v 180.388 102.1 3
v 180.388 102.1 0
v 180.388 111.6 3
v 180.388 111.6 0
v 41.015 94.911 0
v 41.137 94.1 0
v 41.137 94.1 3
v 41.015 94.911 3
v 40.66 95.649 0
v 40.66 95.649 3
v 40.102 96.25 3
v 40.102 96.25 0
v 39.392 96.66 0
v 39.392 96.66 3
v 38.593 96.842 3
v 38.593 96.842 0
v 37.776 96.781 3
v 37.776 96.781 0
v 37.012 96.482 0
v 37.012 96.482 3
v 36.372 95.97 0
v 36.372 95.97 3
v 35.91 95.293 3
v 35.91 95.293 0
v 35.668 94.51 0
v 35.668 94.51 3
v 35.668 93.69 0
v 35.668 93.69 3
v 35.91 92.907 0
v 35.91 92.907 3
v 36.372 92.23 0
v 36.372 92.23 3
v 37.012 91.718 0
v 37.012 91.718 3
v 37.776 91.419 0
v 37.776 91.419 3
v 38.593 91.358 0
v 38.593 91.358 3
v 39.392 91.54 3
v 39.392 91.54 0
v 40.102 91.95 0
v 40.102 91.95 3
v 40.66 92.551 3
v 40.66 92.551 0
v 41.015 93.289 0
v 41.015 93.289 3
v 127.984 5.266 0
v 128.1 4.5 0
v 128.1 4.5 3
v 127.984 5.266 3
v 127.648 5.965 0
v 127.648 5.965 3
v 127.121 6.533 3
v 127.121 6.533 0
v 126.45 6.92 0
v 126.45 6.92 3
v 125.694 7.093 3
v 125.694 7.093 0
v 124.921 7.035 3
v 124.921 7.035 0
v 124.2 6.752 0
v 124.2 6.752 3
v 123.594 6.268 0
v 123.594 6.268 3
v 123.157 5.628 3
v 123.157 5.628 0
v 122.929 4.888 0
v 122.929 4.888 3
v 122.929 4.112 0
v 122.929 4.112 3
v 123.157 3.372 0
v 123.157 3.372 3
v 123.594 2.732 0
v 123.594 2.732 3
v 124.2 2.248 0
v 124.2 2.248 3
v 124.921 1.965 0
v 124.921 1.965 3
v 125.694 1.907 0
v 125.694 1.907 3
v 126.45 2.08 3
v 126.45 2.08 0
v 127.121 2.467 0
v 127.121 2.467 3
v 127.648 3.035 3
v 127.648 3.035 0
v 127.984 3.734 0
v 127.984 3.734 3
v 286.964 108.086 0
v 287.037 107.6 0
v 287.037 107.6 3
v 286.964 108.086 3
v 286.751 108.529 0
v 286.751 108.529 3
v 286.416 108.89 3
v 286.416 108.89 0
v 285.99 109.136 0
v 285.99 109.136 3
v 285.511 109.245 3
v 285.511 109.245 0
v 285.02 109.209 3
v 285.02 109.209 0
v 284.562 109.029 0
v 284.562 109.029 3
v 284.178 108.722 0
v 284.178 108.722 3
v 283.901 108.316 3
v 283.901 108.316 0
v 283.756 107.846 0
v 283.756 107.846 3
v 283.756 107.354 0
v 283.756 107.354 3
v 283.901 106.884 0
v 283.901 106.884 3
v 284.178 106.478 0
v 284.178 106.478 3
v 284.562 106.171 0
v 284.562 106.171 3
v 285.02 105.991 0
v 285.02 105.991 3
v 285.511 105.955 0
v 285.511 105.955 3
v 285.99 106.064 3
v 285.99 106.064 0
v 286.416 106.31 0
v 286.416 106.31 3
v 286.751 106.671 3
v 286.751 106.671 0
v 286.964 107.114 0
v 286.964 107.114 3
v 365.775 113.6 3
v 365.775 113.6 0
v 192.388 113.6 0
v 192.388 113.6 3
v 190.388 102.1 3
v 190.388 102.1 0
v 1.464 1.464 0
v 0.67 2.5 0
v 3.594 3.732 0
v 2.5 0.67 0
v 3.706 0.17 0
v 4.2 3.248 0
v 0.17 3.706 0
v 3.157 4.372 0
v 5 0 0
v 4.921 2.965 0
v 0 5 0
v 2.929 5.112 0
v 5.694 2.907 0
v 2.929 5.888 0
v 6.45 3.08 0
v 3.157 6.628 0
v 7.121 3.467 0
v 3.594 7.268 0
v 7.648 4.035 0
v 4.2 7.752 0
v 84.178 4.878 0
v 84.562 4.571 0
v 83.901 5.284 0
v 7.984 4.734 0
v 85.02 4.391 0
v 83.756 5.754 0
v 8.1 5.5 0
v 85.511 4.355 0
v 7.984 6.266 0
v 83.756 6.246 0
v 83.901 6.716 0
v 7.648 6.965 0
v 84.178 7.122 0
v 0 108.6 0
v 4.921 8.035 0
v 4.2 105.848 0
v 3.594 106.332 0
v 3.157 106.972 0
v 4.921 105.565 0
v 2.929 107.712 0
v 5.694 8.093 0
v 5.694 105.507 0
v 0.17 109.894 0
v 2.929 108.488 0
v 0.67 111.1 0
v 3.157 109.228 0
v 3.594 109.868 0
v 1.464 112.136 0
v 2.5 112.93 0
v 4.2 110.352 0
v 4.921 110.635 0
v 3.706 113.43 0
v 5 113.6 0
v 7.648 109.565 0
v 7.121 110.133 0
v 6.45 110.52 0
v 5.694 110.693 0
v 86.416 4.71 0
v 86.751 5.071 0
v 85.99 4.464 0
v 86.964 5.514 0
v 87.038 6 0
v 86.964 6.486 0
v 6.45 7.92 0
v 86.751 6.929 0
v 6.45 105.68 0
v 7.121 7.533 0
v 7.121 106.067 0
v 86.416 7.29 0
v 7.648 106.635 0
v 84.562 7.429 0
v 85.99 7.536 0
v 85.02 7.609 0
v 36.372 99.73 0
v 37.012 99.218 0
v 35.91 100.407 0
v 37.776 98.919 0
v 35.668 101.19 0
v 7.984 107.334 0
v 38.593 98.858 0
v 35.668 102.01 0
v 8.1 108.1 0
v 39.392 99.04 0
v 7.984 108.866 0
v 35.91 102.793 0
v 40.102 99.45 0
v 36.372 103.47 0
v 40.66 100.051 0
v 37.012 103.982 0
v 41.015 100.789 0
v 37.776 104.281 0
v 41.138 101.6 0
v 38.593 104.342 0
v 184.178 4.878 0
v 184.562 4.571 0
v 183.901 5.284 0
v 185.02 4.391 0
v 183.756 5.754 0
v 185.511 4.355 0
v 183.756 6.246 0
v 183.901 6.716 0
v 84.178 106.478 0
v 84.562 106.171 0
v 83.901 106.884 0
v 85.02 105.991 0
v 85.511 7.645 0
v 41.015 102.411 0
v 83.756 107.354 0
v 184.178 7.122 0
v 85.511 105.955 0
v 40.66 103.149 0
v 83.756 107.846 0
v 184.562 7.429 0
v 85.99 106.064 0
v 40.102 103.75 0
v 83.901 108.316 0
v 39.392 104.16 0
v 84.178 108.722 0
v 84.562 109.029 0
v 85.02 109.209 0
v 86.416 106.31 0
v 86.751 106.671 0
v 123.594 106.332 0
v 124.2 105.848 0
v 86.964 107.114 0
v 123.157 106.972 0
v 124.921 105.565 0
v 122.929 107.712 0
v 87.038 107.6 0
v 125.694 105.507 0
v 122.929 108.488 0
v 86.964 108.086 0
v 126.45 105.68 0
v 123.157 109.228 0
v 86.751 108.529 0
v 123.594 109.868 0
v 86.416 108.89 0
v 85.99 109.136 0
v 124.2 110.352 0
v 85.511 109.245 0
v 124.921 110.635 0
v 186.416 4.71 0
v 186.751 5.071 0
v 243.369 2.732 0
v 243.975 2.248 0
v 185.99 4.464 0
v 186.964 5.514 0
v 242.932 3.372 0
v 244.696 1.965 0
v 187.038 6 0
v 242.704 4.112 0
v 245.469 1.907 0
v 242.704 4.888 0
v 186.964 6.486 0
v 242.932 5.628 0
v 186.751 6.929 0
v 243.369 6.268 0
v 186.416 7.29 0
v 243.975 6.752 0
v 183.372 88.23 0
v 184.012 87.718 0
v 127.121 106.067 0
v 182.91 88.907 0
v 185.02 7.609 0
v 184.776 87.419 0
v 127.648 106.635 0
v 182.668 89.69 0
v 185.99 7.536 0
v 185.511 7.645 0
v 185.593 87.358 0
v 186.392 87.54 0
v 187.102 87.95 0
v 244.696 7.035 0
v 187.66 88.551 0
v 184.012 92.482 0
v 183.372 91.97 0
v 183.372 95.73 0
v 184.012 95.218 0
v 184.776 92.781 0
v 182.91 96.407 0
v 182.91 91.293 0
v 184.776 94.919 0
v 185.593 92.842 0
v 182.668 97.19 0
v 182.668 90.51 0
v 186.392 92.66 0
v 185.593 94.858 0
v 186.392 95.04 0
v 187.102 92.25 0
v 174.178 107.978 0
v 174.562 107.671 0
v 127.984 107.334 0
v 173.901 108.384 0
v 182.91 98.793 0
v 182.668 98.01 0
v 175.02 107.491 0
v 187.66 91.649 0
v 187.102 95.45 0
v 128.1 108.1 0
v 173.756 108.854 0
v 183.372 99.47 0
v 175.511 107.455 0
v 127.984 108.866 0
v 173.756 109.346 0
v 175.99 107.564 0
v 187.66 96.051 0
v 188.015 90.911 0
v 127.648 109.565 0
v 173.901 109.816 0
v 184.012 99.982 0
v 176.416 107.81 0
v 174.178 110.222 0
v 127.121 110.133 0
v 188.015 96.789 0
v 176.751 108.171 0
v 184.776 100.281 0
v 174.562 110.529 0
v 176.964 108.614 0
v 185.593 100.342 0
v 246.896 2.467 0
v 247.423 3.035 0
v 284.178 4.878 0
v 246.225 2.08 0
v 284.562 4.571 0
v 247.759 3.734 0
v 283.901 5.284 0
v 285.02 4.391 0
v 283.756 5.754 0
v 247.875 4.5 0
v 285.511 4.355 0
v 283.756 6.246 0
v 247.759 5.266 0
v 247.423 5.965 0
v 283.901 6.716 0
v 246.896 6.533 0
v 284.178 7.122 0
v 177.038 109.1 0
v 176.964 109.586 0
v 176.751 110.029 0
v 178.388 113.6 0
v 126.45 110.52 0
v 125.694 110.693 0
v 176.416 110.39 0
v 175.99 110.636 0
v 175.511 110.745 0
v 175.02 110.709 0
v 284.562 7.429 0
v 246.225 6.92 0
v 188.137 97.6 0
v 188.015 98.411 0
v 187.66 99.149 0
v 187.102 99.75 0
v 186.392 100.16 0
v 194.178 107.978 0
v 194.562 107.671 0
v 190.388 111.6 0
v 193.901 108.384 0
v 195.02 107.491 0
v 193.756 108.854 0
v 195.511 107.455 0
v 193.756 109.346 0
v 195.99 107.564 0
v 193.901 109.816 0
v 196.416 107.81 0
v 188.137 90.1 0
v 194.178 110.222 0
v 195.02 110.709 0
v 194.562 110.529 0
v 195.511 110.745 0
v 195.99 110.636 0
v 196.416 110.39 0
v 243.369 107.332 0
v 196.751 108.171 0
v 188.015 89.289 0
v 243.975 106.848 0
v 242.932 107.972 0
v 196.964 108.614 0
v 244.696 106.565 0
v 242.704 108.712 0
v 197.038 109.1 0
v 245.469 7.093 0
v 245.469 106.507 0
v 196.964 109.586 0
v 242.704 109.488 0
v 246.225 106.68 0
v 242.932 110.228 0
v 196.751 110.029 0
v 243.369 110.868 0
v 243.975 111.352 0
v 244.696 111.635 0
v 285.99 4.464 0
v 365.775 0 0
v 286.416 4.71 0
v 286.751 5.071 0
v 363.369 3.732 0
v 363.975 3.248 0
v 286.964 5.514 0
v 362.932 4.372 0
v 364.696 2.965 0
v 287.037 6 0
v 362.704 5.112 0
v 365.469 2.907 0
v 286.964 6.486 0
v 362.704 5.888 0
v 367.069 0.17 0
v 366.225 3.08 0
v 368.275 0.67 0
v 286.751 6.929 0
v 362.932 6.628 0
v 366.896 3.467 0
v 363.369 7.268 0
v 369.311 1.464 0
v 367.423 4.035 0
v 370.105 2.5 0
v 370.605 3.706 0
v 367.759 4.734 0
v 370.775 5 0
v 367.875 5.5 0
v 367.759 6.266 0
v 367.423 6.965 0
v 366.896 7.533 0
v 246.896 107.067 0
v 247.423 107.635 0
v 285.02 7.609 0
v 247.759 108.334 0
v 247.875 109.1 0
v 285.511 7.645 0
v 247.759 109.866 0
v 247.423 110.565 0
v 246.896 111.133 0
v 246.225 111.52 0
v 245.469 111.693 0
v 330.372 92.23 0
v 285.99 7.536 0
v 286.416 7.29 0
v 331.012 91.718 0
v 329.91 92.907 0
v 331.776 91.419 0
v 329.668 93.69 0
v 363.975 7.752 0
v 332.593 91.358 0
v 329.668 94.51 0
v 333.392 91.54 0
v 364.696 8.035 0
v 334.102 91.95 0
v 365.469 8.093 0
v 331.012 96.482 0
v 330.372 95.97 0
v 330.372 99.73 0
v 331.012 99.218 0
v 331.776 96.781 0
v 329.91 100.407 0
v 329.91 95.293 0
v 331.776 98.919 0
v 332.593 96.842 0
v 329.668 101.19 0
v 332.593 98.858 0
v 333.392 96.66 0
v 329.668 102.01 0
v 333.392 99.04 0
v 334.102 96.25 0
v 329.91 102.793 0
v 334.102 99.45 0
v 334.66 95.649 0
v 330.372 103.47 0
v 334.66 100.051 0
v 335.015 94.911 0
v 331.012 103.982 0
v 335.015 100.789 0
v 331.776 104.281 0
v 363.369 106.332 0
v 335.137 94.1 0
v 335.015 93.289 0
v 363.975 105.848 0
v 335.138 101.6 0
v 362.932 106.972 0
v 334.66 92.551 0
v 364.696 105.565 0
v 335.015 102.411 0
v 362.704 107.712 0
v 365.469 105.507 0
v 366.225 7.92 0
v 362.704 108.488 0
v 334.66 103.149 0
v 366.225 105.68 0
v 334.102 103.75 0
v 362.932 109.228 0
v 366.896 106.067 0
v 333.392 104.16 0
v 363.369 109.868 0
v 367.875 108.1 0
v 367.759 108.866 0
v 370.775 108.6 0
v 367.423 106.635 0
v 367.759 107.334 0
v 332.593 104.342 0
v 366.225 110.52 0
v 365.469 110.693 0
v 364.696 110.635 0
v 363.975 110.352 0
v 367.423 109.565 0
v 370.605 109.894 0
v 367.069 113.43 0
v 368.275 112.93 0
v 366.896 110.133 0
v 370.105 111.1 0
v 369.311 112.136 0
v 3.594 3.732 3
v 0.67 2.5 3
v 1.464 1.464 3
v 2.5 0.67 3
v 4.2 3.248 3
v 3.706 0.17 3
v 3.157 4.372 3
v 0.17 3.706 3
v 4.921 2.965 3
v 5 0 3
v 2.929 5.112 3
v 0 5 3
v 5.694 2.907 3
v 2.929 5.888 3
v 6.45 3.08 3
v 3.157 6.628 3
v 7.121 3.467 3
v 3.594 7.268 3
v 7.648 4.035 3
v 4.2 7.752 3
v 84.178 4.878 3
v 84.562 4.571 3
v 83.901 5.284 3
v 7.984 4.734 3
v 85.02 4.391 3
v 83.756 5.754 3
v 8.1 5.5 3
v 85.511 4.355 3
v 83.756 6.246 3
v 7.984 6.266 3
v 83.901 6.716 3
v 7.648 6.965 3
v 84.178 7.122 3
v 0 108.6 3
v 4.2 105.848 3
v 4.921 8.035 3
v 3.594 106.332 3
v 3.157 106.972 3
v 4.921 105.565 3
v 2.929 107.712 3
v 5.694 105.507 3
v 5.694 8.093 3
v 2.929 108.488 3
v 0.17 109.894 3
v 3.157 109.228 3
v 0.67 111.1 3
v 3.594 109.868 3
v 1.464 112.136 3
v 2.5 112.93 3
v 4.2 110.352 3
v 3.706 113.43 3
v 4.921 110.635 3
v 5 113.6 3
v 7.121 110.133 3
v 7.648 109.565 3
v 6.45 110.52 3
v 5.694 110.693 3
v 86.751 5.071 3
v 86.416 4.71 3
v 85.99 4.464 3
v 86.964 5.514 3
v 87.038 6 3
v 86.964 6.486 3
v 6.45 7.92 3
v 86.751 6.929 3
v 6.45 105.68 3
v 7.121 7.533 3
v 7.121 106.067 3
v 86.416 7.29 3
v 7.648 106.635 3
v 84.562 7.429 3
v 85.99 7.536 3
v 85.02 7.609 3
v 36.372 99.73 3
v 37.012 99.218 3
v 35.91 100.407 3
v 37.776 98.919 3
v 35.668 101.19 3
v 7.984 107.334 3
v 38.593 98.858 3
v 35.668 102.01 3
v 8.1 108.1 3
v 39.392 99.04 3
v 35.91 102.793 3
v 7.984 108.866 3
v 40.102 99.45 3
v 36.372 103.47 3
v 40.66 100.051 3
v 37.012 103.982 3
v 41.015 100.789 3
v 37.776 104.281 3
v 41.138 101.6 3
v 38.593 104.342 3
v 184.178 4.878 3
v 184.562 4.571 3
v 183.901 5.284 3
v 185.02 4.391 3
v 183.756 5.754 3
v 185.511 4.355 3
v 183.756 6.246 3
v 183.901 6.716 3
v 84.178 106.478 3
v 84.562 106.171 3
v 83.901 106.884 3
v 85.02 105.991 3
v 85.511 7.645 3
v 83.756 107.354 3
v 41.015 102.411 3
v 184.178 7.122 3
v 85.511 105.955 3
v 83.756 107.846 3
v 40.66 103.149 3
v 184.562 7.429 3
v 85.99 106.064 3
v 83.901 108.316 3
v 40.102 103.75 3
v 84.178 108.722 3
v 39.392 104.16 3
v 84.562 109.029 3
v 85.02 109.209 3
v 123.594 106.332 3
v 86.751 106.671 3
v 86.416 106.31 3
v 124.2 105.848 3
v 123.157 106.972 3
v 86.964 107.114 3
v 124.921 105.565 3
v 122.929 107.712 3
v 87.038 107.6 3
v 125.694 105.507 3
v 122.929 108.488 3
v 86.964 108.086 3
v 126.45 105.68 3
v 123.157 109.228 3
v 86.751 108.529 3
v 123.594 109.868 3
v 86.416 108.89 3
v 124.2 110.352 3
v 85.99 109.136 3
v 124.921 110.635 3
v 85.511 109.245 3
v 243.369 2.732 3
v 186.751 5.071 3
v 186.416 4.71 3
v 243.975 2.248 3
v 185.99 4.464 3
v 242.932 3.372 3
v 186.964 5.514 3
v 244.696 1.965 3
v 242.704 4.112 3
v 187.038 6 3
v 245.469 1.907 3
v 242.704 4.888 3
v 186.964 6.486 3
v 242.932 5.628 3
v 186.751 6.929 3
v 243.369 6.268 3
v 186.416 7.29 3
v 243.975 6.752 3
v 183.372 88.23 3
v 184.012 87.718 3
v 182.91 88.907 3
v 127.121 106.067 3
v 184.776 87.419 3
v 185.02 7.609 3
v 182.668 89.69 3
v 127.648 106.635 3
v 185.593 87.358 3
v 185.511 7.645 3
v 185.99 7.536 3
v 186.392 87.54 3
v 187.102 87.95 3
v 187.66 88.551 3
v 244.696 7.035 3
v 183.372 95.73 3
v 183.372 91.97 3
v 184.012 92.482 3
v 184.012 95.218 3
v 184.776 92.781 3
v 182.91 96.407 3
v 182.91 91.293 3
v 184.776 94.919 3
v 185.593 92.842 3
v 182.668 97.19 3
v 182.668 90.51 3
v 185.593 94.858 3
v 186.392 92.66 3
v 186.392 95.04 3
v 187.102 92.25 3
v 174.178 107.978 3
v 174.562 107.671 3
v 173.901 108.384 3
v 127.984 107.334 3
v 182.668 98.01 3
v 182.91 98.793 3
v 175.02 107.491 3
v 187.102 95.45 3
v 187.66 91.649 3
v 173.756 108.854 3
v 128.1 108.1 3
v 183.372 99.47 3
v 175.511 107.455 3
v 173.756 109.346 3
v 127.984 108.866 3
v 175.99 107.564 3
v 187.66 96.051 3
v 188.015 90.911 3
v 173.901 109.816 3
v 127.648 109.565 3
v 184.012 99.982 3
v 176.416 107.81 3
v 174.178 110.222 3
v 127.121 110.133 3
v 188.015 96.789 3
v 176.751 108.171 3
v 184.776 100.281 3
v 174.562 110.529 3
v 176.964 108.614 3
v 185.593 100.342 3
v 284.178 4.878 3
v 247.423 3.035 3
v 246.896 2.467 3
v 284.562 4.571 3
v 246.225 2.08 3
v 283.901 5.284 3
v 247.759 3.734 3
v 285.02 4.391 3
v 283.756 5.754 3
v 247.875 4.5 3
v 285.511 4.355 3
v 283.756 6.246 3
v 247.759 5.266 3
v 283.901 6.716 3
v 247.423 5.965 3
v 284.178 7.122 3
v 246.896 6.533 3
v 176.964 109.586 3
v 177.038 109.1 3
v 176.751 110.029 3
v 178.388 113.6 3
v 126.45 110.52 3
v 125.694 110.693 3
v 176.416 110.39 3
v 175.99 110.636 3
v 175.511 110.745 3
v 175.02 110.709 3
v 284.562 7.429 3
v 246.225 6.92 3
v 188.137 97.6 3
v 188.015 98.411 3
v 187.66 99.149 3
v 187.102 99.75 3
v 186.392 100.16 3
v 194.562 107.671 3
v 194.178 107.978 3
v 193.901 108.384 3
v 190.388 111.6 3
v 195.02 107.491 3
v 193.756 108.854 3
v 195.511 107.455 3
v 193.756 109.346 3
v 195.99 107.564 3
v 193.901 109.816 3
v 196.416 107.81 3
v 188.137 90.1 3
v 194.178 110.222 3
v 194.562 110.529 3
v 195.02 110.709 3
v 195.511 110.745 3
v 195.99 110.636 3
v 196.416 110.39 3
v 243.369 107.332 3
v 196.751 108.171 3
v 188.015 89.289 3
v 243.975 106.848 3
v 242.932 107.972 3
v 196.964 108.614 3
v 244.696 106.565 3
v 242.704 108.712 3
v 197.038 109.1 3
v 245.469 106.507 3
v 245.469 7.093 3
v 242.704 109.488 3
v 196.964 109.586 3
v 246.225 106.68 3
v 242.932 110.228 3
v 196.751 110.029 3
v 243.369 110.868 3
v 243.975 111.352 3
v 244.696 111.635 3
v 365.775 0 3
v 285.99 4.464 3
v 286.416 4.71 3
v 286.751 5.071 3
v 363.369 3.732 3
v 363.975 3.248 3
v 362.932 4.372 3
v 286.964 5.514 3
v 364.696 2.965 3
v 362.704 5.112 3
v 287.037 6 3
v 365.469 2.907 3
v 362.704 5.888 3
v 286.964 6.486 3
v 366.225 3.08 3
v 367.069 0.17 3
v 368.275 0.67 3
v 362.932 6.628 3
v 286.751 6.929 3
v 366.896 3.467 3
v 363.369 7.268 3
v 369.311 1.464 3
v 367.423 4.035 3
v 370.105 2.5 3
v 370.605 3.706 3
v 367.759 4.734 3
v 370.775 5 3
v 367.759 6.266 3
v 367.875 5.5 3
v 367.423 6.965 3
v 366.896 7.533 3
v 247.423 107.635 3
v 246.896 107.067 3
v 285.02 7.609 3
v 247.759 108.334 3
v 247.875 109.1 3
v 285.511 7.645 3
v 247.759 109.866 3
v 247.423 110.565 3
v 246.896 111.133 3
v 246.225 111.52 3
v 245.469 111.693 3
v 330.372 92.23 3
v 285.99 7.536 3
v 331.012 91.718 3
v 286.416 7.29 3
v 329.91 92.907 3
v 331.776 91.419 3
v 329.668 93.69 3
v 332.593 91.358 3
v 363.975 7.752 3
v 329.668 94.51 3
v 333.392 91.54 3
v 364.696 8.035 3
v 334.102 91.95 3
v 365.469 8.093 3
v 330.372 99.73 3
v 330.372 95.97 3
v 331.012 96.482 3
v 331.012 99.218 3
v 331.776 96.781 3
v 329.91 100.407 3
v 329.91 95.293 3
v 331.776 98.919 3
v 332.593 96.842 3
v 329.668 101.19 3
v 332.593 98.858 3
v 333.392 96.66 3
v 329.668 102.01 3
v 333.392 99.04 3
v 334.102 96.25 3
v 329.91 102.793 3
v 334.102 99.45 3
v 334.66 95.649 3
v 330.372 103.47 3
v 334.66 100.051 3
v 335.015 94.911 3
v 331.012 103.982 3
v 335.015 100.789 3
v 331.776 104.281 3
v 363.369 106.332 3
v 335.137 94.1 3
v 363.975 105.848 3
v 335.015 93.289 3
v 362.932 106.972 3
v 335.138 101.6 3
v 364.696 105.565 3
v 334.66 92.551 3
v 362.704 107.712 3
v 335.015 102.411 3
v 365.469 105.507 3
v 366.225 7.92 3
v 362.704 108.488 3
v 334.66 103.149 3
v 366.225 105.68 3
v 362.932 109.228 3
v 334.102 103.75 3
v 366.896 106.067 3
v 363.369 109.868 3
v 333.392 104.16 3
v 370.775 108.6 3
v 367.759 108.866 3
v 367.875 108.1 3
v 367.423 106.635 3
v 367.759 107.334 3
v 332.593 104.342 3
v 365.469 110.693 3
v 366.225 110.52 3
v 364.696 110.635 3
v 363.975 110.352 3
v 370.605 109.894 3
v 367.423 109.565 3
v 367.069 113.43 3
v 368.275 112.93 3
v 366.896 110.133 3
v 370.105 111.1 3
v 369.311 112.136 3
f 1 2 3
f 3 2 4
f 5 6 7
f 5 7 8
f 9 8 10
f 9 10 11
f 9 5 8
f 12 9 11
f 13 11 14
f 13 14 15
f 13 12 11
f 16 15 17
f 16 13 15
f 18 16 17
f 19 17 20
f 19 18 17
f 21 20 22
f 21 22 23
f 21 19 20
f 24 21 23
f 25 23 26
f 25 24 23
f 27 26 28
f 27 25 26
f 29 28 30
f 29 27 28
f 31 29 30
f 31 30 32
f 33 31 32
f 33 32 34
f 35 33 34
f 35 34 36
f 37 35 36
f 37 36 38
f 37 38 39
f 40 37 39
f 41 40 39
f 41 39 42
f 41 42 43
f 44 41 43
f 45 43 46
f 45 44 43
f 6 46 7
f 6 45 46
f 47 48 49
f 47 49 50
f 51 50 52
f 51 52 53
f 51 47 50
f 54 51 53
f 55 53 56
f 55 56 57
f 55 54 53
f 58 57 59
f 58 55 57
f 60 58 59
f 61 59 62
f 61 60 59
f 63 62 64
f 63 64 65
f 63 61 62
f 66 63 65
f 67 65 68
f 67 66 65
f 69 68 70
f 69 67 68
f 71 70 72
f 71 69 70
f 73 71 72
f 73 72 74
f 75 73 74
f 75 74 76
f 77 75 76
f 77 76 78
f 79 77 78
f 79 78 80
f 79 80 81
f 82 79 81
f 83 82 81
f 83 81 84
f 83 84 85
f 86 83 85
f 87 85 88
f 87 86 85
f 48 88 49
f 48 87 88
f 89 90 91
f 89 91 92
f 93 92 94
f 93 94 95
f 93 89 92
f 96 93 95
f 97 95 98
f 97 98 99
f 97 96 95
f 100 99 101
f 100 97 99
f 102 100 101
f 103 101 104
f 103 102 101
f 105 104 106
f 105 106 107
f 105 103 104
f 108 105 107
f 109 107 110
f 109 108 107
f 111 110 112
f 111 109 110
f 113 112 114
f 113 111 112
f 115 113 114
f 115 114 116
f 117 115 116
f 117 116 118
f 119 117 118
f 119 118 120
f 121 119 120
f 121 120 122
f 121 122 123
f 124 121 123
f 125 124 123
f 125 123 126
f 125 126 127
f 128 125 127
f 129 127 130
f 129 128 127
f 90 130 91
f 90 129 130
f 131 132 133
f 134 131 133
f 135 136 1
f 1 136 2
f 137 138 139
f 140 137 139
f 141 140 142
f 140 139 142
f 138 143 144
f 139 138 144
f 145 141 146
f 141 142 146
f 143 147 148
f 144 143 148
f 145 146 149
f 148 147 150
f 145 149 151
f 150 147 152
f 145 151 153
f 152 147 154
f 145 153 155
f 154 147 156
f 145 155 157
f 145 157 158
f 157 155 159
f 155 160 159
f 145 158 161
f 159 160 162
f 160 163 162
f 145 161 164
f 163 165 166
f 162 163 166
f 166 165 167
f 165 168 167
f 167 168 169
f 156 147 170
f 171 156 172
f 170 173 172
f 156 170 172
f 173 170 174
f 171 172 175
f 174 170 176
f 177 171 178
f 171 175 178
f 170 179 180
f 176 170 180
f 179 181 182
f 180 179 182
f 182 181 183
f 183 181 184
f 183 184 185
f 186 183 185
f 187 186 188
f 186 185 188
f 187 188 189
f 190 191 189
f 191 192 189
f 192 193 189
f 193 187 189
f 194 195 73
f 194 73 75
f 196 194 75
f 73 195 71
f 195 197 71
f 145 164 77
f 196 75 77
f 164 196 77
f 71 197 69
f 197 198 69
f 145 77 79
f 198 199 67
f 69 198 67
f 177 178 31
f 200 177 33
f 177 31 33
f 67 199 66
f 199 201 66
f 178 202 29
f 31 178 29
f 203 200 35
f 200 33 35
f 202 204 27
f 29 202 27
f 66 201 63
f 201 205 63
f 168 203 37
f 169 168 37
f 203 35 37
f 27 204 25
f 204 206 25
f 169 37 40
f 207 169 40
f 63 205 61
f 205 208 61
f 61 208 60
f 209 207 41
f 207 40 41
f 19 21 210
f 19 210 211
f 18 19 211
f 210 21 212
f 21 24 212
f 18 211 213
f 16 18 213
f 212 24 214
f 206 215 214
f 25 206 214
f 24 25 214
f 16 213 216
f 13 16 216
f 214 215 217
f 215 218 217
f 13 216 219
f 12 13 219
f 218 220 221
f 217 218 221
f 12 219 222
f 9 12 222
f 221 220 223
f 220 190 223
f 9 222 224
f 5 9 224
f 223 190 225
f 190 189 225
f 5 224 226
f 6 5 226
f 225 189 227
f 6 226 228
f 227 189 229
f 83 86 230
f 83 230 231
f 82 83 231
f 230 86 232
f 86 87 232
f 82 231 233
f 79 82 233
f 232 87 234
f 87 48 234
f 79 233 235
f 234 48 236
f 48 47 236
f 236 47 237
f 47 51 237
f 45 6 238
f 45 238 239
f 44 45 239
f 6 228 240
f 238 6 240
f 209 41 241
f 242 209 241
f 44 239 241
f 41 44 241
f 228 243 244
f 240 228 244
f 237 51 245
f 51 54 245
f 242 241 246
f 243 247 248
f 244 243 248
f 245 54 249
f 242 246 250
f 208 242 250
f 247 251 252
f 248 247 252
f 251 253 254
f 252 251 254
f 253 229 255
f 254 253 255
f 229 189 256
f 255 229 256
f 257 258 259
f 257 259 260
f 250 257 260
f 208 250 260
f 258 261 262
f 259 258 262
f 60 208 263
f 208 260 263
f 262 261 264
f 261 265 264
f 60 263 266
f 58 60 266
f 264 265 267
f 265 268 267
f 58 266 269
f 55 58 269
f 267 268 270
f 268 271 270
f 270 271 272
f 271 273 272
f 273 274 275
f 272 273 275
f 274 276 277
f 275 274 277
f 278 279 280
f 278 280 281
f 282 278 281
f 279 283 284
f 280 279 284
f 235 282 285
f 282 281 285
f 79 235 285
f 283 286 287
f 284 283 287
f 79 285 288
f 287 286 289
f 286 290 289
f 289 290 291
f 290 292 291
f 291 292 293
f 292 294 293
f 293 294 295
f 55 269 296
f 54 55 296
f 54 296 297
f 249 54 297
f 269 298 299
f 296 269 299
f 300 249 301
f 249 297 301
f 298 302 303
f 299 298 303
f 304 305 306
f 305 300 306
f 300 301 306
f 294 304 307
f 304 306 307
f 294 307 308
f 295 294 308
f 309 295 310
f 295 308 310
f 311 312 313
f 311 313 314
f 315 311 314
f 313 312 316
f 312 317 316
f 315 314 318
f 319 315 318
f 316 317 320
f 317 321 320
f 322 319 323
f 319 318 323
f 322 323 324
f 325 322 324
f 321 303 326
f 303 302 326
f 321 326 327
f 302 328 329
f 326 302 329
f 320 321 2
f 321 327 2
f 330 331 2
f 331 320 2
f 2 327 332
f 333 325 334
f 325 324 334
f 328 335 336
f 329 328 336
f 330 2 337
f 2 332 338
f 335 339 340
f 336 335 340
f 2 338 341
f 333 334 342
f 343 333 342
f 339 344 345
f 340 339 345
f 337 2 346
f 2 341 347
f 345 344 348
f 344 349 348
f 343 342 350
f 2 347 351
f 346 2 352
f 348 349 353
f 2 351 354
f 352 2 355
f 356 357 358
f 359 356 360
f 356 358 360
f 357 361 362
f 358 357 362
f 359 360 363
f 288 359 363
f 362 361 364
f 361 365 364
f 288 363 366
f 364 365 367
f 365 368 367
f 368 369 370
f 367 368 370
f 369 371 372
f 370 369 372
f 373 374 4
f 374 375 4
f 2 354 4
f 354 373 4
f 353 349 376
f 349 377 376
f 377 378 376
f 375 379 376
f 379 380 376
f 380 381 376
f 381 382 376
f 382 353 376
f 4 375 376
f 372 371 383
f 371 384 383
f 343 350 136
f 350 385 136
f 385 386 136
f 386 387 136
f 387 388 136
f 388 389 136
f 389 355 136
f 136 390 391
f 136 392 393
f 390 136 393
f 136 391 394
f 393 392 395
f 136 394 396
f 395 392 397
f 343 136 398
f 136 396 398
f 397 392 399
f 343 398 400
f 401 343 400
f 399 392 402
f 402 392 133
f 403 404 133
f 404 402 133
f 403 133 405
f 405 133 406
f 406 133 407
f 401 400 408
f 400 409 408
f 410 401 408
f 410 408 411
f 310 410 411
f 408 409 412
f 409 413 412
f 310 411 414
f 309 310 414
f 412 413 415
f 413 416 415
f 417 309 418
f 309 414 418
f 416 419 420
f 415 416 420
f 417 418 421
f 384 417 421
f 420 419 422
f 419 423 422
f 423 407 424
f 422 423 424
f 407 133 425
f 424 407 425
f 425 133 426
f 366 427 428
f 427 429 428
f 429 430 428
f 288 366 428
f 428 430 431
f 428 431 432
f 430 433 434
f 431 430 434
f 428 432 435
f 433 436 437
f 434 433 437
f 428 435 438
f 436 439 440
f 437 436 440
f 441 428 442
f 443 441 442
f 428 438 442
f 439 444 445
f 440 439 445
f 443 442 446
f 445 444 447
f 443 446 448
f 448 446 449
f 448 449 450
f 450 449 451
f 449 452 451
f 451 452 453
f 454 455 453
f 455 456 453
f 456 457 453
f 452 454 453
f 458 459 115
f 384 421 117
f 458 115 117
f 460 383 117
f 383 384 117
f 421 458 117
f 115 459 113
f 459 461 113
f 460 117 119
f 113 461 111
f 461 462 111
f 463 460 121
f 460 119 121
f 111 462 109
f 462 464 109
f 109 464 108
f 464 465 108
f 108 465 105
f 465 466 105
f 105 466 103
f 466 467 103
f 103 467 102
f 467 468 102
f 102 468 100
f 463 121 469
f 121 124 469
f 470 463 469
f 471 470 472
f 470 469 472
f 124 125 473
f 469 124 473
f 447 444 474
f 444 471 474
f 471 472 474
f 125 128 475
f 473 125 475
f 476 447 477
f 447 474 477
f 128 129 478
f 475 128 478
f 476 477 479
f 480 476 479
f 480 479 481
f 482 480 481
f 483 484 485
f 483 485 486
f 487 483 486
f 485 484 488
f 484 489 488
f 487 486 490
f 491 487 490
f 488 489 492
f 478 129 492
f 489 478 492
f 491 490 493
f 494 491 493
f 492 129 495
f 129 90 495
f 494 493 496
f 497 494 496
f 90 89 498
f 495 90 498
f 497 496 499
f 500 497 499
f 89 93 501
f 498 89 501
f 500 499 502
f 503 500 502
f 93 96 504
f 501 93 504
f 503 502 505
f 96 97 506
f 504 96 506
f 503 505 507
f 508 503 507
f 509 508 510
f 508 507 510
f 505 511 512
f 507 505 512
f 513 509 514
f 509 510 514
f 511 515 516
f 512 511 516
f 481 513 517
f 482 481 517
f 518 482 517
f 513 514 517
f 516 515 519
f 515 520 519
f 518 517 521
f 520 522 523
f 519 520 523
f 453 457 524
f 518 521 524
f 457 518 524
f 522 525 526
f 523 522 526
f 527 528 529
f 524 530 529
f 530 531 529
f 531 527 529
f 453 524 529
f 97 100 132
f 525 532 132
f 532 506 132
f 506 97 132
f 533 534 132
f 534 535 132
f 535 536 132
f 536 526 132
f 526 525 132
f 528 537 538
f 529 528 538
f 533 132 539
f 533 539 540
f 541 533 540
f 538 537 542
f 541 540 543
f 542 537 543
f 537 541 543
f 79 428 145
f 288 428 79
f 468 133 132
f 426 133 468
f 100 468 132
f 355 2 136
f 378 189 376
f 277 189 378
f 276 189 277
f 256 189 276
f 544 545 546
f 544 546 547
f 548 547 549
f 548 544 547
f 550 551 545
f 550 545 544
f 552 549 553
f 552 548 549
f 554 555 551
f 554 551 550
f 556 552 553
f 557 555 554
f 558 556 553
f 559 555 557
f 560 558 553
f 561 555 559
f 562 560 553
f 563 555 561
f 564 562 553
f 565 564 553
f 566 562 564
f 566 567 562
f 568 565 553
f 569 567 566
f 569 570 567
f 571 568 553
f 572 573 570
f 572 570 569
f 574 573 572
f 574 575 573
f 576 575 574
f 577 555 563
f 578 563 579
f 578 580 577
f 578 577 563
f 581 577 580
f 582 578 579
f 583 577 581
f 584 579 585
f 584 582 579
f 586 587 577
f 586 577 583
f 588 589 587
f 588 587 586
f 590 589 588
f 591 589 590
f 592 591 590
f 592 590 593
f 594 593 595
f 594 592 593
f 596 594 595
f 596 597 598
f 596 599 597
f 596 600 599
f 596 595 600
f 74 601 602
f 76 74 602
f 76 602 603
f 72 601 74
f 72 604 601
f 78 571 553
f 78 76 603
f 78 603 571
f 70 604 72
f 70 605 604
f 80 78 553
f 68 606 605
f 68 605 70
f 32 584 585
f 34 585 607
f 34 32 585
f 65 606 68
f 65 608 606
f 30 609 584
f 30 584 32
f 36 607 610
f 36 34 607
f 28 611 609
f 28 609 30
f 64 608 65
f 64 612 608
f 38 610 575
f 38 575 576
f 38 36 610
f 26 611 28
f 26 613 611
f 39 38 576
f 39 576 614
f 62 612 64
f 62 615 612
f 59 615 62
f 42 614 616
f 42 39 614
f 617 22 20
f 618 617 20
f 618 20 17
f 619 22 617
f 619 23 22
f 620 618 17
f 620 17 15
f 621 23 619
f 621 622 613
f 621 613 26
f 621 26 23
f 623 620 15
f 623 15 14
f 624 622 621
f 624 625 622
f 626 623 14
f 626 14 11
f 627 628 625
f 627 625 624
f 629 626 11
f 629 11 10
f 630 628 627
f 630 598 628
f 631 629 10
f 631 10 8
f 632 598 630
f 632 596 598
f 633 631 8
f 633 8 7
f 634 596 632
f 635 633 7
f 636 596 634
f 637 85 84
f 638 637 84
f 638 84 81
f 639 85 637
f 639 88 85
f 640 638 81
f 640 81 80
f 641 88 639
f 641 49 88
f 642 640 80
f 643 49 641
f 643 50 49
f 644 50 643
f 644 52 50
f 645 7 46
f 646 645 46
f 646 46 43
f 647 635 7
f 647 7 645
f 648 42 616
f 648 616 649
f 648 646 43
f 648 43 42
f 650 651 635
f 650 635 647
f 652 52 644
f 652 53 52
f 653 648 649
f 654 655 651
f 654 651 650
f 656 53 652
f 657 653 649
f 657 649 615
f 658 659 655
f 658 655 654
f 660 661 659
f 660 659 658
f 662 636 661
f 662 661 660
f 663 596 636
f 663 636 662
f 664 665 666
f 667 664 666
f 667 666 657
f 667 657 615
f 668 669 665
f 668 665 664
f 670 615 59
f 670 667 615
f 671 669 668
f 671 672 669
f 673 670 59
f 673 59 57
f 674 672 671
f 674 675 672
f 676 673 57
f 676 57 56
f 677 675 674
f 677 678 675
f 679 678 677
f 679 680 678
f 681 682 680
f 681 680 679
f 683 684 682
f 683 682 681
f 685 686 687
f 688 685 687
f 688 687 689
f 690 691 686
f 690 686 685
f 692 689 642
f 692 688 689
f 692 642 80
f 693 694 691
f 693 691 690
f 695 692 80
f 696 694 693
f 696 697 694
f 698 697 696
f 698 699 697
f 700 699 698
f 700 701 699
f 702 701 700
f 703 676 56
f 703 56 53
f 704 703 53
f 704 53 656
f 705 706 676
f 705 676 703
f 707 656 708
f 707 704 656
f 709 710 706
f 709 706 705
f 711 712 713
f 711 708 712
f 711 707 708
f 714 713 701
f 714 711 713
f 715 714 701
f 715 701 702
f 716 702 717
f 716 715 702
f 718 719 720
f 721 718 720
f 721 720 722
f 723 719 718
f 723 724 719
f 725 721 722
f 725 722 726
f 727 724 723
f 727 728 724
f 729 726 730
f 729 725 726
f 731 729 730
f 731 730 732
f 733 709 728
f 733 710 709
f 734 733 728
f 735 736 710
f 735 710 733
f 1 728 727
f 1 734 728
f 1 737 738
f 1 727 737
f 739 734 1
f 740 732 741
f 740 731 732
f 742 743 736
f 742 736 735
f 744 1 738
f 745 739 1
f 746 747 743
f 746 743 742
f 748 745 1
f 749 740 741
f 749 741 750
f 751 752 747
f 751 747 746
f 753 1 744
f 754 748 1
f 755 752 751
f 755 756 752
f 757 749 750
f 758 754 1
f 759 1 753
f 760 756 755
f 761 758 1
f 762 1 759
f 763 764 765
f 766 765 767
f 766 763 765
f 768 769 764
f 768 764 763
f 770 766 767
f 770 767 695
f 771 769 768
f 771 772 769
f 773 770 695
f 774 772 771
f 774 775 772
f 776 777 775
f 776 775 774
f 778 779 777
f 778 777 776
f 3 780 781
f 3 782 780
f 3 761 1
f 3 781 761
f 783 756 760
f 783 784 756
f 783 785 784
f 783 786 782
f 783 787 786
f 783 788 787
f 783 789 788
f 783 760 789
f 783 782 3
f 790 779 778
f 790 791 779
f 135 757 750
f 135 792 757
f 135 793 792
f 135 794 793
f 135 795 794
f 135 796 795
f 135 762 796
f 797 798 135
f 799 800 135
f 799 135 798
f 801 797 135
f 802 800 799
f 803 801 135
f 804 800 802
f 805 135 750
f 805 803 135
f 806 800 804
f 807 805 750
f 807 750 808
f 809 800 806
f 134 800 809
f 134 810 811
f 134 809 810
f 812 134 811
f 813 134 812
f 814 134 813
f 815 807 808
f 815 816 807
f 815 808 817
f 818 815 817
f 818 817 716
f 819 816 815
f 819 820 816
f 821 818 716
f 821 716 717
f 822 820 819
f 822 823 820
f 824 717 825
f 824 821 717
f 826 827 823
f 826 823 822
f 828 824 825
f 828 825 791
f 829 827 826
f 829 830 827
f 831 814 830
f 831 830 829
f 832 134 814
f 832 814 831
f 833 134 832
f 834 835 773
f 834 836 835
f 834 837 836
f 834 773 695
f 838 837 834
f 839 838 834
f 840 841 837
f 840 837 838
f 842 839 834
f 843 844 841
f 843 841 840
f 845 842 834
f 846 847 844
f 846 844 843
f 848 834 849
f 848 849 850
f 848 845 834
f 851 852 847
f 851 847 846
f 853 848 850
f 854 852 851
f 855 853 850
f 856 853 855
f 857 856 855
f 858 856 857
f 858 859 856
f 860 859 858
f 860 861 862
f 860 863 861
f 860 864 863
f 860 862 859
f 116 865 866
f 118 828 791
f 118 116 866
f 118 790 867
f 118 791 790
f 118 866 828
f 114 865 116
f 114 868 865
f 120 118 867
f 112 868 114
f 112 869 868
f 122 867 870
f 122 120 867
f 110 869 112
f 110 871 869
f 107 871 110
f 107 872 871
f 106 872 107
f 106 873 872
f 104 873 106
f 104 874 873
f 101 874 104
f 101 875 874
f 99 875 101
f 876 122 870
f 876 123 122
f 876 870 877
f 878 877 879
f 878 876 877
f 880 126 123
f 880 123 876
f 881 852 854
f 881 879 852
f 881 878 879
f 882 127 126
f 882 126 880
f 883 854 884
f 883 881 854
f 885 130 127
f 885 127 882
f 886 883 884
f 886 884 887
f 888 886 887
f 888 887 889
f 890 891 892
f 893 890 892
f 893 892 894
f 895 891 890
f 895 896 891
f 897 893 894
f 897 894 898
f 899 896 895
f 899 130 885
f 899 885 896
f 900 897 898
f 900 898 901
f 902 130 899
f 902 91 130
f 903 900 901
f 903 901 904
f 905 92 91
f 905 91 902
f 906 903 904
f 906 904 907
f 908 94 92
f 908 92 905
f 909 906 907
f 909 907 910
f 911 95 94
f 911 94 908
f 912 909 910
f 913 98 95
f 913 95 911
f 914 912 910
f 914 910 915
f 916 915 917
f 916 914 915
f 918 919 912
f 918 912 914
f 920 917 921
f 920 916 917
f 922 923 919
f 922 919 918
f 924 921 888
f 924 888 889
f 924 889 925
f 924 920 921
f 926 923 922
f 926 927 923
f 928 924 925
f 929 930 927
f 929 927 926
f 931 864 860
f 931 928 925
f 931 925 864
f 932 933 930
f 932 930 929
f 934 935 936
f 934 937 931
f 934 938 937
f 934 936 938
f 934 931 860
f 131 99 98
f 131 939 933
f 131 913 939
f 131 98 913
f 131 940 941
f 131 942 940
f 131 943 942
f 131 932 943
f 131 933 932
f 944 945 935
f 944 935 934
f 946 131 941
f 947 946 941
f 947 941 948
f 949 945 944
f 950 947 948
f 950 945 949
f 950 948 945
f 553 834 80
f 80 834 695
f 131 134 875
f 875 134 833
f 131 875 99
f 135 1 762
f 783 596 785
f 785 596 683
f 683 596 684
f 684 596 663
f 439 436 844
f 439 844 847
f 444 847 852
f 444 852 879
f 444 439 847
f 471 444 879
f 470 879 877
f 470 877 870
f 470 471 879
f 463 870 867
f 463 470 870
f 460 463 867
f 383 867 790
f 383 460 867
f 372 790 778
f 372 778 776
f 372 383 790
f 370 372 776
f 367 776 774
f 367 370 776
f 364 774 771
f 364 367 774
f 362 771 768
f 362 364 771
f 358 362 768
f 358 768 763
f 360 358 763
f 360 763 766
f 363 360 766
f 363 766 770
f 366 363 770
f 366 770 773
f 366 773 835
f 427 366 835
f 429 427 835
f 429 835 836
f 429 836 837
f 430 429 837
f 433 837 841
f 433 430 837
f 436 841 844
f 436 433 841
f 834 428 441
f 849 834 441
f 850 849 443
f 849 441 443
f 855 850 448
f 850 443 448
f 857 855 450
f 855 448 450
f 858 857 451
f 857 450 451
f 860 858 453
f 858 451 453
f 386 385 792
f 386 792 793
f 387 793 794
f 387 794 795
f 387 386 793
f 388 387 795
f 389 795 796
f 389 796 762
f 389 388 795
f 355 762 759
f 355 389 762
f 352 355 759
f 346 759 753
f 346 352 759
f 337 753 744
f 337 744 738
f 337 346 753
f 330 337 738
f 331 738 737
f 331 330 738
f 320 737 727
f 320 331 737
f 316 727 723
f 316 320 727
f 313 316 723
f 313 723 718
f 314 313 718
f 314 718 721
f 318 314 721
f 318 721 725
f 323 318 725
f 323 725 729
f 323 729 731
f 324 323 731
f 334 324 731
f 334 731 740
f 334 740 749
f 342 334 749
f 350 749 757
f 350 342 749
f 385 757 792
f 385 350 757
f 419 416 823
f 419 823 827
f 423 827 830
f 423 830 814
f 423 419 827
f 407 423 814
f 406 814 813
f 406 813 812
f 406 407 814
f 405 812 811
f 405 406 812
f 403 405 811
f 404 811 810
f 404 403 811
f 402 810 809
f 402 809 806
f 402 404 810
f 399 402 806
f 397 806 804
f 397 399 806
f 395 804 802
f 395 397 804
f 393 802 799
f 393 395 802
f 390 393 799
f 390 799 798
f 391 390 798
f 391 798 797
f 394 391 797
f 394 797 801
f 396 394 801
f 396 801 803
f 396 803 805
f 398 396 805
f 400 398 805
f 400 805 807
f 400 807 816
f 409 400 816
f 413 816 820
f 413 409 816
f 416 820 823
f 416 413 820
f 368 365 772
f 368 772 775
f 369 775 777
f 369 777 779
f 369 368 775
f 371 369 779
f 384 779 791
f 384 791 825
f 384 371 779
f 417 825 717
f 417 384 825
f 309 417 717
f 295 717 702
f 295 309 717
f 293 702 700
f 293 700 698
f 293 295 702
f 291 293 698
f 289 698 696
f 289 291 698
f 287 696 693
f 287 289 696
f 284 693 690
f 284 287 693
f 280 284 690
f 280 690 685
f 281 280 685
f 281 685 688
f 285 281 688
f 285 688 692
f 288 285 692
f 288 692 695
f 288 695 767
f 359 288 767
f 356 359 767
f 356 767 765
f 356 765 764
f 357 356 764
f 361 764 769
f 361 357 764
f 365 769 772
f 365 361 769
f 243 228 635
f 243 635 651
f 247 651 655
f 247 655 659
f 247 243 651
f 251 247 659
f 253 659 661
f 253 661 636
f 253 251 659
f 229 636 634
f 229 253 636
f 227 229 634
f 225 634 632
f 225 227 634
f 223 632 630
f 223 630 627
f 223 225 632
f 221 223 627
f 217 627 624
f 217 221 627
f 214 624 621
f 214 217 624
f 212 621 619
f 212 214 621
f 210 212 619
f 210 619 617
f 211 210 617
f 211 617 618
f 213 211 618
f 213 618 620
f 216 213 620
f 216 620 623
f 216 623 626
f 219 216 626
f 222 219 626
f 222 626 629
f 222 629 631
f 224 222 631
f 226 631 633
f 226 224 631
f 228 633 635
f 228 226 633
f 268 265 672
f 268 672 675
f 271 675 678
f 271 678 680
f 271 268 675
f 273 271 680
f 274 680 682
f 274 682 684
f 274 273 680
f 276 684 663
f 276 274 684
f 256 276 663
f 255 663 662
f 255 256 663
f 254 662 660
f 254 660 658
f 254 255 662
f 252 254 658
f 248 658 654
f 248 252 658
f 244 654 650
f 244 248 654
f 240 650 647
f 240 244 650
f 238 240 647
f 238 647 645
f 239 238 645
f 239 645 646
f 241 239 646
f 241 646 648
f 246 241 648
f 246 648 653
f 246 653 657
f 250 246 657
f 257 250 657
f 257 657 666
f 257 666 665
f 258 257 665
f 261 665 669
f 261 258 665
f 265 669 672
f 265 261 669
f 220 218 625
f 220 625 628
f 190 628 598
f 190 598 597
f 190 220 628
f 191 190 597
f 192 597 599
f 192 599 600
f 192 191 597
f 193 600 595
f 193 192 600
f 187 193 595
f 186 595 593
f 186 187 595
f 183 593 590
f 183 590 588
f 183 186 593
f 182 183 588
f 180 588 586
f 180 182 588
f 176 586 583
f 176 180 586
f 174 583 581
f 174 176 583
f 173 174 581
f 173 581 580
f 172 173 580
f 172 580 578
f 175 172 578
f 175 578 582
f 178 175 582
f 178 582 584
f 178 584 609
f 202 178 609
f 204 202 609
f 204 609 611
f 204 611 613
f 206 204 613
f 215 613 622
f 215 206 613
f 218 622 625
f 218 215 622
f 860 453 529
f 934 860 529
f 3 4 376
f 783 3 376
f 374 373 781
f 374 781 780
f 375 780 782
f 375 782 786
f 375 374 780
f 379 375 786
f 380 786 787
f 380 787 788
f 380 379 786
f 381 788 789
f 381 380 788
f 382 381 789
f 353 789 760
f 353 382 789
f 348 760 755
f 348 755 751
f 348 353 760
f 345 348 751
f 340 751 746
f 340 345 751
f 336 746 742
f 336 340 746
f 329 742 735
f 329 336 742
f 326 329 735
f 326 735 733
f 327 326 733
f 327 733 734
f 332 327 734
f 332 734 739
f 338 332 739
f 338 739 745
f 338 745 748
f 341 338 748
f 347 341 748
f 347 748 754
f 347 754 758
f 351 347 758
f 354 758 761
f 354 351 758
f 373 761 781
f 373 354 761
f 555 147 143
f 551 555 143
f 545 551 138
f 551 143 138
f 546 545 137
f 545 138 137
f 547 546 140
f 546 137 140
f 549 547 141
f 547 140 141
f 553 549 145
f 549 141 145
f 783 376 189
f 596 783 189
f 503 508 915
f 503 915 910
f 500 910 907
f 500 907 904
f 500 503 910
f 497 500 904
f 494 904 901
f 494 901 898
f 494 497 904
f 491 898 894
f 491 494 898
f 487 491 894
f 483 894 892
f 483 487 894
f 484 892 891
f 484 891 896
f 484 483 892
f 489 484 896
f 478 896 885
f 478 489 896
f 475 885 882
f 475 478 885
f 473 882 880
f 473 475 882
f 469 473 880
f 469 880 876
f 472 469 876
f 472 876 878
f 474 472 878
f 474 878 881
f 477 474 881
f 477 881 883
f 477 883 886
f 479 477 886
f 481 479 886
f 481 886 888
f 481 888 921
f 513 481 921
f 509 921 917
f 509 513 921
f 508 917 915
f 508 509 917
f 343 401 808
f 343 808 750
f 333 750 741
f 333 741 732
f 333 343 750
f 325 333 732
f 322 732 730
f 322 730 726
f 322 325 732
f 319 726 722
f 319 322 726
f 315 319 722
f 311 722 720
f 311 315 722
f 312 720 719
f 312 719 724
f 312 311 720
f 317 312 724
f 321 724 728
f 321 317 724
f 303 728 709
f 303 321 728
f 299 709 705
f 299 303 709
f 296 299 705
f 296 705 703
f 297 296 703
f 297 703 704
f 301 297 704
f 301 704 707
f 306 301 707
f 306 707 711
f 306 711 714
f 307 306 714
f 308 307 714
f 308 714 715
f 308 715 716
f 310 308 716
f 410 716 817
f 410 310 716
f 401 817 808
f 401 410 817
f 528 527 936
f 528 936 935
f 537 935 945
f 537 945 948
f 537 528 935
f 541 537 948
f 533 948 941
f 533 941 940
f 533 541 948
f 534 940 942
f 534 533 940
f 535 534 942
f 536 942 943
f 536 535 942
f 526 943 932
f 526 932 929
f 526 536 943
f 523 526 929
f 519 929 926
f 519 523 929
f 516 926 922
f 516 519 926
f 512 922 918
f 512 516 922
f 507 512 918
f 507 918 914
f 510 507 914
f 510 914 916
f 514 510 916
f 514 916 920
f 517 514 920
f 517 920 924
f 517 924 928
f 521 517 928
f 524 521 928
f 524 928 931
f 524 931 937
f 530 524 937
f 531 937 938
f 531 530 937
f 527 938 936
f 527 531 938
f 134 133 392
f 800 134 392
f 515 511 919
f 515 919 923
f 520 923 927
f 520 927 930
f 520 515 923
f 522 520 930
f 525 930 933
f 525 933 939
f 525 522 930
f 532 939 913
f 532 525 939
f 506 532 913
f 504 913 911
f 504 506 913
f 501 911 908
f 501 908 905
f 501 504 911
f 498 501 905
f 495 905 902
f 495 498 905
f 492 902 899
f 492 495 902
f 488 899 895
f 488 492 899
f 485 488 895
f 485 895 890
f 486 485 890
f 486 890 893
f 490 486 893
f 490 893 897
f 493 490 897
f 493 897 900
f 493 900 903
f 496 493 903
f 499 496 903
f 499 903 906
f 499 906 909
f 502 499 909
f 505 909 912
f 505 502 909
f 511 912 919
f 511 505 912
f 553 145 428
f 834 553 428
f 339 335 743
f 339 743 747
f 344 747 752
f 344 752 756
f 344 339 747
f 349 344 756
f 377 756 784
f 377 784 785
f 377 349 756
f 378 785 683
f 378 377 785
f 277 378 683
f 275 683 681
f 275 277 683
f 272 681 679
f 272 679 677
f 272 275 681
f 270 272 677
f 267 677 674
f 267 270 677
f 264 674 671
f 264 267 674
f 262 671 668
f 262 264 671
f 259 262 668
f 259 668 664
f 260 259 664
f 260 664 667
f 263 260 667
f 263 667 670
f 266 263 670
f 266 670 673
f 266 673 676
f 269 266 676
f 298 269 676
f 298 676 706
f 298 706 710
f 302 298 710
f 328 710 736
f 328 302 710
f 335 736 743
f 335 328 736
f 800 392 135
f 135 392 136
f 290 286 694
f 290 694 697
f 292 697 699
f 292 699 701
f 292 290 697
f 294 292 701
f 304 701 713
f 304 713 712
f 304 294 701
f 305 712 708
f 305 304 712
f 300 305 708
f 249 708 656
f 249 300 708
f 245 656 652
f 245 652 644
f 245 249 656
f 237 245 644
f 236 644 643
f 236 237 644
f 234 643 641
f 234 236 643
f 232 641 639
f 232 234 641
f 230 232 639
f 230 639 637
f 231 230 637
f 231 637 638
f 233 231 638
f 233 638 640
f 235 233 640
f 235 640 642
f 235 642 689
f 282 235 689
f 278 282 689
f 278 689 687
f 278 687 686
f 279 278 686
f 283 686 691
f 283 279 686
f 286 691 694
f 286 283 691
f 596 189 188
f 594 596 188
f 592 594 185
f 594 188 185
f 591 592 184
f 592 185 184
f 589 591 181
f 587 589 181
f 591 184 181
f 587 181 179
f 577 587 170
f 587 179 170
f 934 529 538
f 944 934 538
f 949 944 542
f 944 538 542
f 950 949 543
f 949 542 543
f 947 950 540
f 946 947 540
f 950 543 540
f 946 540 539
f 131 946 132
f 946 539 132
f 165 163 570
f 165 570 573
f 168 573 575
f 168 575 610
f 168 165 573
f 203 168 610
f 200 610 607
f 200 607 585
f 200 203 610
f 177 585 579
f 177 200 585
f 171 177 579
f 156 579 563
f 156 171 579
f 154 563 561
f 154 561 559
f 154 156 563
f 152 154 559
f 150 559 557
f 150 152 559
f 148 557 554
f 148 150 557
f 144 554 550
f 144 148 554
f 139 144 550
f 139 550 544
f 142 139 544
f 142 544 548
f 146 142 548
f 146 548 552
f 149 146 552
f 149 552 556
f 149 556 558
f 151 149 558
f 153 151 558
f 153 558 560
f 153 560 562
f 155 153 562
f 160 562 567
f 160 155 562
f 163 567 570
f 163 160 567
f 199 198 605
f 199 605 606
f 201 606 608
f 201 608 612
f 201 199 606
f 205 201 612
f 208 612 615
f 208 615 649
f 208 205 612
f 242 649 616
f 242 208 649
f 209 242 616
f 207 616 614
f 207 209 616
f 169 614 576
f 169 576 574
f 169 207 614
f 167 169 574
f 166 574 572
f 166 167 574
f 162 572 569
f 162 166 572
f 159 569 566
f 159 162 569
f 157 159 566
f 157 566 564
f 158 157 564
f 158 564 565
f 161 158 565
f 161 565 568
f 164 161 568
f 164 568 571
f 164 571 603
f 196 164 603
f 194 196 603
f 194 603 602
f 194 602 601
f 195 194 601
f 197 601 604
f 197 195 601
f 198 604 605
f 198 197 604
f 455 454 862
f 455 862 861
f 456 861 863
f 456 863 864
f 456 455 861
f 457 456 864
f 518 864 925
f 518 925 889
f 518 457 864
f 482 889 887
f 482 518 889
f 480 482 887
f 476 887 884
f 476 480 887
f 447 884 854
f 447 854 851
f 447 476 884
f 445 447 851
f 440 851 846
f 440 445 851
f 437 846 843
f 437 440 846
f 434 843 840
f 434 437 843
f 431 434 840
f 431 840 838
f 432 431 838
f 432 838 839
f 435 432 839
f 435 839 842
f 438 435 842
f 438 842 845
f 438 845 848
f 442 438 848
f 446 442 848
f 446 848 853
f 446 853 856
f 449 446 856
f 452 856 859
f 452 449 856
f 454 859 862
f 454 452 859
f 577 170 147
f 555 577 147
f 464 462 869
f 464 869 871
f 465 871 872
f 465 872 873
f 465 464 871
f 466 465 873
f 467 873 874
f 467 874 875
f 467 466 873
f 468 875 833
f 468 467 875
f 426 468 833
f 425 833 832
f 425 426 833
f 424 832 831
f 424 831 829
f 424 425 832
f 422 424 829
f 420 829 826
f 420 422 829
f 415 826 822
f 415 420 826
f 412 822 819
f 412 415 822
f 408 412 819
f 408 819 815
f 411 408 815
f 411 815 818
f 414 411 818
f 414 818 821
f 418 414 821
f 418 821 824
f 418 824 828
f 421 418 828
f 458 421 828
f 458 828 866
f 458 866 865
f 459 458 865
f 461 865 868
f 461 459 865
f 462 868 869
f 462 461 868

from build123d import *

# Parameters (mm, degrees)
MODEL_R             = 2.6
MODEL_R_2           = 1.65
MODEL_R_3           = 2.75
BOSS_EXTRUDE1_DEPTH = 3


with BuildPart() as part:
    # Model → Boss-Extrude1 (new body)
    with BuildSketch(Plane.XY):
        with BuildLine():
            Line((0, 108.6), (0, 5))
            ThreePointArc((0, 5), (1.464466094, 1.464466094), (5, 0))
            Line((5, 0), (365.775, 0))
            ThreePointArc((365.775, 0), (369.310533906, 1.464466094), (370.775, 5))
            Line((370.775, 5), (370.775, 108.6))
            ThreePointArc((370.775, 108.6), (369.310533906, 112.135533906), (365.775, 113.6))
            Line((365.775, 113.6), (192.387500002, 113.6))
            Line((192.387500002, 113.6), (190.387500002, 111.6))
            Line((190.387500002, 111.6), (190.387500002, 102.1))
            Line((190.387500002, 102.1), (180.387500002, 102.1))
            Line((180.387500002, 102.1), (180.387500001, 111.6))
            Line((180.387500001, 111.6), (178.387500002, 113.6))
            Line((178.387500002, 113.6), (5, 113.6))
            ThreePointArc((5, 113.6), (1.464466094, 112.135533906), (0, 108.6))
        make_face()
        with Locations((5.5, 108.1)):
            Circle(MODEL_R, mode=Mode.SUBTRACT)
        with Locations((5.5, 5.5)):
            Circle(MODEL_R, mode=Mode.SUBTRACT)
        with Locations((365.275, 5.5)):
            Circle(MODEL_R, mode=Mode.SUBTRACT)
        with Locations((365.275, 108.1)):
            Circle(MODEL_R, mode=Mode.SUBTRACT)
        with Locations((125.5, 4.5)):
            Circle(MODEL_R, mode=Mode.SUBTRACT)
        with Locations((195.3875, 109.1)):
            Circle(MODEL_R_2, mode=Mode.SUBTRACT)
        with Locations((175.3875, 109.1)):
            Circle(MODEL_R_2, mode=Mode.SUBTRACT)
        with Locations((38.387499996, 94.1)):
            Circle(MODEL_R_3, mode=Mode.SUBTRACT)
        with Locations((38.3875, 101.6)):
            Circle(MODEL_R_3, mode=Mode.SUBTRACT)
        with Locations((332.387499996, 94.1)):
            Circle(MODEL_R_3, mode=Mode.SUBTRACT)
        with Locations((332.3875, 101.6)):
            Circle(MODEL_R_3, mode=Mode.SUBTRACT)
        with Locations((185.387499995, 90.1)):
            Circle(MODEL_R_3, mode=Mode.SUBTRACT)
        with Locations((185.387499999, 97.6)):
            Circle(MODEL_R_3, mode=Mode.SUBTRACT)
        with Locations((85.3875, 107.6)):
            Circle(MODEL_R_2, mode=Mode.SUBTRACT)
        with Locations((285.3875, 107.6)):
            Circle(MODEL_R_2, mode=Mode.SUBTRACT)
        with Locations((85.3875, 6)):
            Circle(MODEL_R_2, mode=Mode.SUBTRACT)
        with Locations((185.3875, 6)):
            Circle(MODEL_R_2, mode=Mode.SUBTRACT)
        with Locations((285.3875, 6)):
            Circle(MODEL_R_2, mode=Mode.SUBTRACT)
        with Locations((245.275, 4.5)):
            Circle(MODEL_R, mode=Mode.SUBTRACT)
        with Locations((125.499999999, 108.1)):
            Circle(MODEL_R, mode=Mode.SUBTRACT)
        with Locations((245.275, 109.1)):
            Circle(MODEL_R, mode=Mode.SUBTRACT)
    extrude(amount=BOSS_EXTRUDE1_DEPTH)


solid = part.part
